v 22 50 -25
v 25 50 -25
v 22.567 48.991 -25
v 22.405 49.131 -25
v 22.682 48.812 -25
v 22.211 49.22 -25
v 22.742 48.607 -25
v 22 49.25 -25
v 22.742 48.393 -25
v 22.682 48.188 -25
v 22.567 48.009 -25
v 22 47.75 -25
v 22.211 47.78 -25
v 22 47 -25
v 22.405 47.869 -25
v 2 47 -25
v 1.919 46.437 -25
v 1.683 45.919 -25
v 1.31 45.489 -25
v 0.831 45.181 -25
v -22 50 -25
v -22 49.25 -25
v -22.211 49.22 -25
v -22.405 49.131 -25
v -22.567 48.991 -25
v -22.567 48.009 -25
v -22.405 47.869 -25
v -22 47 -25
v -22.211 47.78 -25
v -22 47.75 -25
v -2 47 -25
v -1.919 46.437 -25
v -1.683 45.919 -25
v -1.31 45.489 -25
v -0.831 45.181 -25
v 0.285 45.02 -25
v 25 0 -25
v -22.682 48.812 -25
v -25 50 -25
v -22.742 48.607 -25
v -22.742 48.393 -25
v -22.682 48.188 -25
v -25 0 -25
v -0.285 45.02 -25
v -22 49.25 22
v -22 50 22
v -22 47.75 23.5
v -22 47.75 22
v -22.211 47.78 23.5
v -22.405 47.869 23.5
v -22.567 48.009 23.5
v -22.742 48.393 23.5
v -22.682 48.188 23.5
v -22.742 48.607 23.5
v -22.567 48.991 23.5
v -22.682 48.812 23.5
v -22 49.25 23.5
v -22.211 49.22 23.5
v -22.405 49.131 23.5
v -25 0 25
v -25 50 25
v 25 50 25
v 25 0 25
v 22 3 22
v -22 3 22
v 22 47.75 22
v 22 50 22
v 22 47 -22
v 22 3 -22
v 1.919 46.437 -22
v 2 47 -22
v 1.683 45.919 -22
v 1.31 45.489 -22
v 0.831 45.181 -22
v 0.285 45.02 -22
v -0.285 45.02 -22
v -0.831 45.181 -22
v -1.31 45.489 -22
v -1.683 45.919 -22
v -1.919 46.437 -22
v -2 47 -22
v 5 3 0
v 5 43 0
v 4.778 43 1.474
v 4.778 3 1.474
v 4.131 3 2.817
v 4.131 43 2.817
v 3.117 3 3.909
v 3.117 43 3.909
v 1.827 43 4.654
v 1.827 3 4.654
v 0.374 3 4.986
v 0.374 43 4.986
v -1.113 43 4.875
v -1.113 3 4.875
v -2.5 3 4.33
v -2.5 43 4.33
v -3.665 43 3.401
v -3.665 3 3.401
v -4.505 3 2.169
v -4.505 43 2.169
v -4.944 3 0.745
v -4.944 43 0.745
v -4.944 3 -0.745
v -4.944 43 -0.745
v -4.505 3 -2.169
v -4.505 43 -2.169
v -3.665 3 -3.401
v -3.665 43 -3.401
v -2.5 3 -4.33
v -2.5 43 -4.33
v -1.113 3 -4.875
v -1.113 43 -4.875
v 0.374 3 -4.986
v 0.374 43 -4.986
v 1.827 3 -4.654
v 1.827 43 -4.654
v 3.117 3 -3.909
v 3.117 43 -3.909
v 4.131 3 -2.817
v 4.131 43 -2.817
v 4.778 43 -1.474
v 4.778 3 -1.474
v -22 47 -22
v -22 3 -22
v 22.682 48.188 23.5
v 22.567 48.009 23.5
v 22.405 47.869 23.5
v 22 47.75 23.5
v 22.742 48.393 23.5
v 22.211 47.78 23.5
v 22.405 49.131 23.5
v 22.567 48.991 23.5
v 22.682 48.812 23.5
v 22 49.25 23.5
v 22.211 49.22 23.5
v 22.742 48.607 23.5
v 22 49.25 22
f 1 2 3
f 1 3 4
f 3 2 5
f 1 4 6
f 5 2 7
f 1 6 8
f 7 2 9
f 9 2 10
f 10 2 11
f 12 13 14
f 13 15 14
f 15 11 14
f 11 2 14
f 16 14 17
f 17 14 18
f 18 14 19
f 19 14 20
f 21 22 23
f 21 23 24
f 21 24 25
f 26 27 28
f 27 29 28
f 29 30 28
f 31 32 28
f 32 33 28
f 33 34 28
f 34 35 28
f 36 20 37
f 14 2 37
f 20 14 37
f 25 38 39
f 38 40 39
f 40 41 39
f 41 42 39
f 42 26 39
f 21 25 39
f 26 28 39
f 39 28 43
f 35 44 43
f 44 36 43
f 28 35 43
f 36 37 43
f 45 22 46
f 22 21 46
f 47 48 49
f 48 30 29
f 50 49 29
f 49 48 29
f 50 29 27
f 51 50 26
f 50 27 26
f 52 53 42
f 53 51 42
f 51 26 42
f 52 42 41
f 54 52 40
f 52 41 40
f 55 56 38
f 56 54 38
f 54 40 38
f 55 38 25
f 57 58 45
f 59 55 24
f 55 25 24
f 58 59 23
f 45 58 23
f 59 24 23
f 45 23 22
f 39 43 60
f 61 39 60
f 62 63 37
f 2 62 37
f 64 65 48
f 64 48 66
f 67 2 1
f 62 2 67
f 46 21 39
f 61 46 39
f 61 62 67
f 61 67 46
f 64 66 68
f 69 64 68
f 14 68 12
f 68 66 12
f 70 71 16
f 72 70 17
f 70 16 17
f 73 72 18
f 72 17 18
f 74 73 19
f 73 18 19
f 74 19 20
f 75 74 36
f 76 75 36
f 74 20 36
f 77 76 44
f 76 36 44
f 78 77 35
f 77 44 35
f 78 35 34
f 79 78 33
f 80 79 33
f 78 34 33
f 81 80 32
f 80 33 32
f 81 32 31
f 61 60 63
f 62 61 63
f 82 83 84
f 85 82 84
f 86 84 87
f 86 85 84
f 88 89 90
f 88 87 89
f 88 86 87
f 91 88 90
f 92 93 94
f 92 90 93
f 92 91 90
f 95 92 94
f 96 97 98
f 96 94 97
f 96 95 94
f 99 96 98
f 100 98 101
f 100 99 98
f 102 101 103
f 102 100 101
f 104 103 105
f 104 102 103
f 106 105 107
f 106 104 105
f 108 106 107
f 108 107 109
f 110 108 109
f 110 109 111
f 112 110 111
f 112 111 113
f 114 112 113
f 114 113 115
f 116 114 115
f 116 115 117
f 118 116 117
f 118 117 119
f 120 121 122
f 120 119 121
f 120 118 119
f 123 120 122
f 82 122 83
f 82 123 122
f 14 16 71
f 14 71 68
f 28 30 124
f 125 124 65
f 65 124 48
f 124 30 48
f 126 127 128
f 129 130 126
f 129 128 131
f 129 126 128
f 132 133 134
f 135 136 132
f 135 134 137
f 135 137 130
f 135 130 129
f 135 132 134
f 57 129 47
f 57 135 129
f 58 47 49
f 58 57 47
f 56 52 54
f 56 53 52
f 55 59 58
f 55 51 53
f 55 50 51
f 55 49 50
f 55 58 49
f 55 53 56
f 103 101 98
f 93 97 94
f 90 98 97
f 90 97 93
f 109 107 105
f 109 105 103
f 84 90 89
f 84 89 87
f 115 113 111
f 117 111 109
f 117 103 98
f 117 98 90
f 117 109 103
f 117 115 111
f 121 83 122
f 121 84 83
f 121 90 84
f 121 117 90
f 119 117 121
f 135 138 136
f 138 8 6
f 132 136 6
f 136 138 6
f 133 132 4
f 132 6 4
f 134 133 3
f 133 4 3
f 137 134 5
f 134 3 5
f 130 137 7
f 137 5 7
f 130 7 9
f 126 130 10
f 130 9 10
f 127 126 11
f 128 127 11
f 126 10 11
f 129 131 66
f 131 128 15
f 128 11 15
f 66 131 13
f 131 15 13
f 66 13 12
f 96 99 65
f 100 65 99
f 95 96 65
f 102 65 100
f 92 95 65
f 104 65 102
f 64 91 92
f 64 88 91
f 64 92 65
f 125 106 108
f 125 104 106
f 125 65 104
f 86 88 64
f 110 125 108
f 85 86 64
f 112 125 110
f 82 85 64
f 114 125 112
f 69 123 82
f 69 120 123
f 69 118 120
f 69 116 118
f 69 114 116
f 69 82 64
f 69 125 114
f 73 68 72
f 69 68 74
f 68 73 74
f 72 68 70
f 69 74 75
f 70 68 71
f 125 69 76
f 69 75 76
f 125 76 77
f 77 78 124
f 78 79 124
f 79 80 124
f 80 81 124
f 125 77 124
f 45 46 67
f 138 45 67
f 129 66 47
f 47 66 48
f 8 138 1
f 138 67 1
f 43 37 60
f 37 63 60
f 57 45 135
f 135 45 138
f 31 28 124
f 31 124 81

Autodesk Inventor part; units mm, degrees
ref_plane "YZ Plane" through (0, 0, 0) normal (1, 0, 0) x (0, 1, 0)
ref_plane "XZ Plane" through (0, 0, 0) normal (0, 1, 0) x (-1, 0, 0)
ref_plane "XY Plane" through (0, 0, 0) normal (0, 0, 1) x (1, 0, 0)
sketch "Sketch1" plane through (0, 0, 0) normal (0, 1, 0) x (-1, 0, 0)
  line L0 (25, 25) -> (-25, 25)
  line L1 (-25, 25) -> (-25, -25)
  line L2 (-25, -25) -> (25, -25)
  line L3 (25, -25) -> (25, 25)
  point P0 (0, 0)
  dimension "d0" = 25
  dimension "d1" = 50
  dimension "d2" = 25
  dimension "d3" = 25
extrude "Extrusion1" add sketch "Sketch1" along normal blind 50
sketch "Sketch2" plane through (0, 50, 0) normal (0, 1, 0) x (1, 0, 0)
  line L0 (-22, -22) -> (22, -22)
  line L1 (22, -22) -> (22, 22)
  line L2 (22, 22) -> (-22, 22)
  line L3 (-22, 22) -> (-22, -22)
  point P0 (0, 0)
  dimension "d6" = 22
  dimension "d7" = 22
  dimension "d8" = 22
  dimension "d9" = 22
extrude "Extrusion2" cut sketch "Sketch2" against normal blind 47
sketch "Sketch3" plane through (0, 3, 0) normal (0, 1, 0) x (1, 0, 0)
  circle A0 centre (0, 0) radius 5
  dimension "d12" = 10
extrude "Extrusion3" add sketch "Sketch3" along normal blind 40
sketch "Sketch4" plane through (0, 50, 0) normal (0, 1, 0) x (1, 0, 0)
  line L0 (-22, 22) -> (22, 22)
  line L1 (22, 22) -> (22, 25)
  line L2 (22, 25) -> (-22, 25)
  line L3 (-22, 25) -> (-22, 22)
  line L4 (25, -25) -> (25, 25) projected
  point P0 (0, 0)
  dimension "d15" = 3
  dimension "d16" = 25
extrude "Extrusion4" cut sketch "Sketch4" against normal blind 3
sketch "Sketch5" plane through (-22, 3, -22) normal (0, 0, 1) x (1, 0, 0)
  point P0 (22, -3)
sketch "Sketch6" plane through (25, 0, -25) normal (0, 0, -1) x (-1, 0, 0)
  line L0 (3, 47) -> (47, 47) projected
  circle A0 centre (25, 47) radius 2
  point P0 (25, 0)
  dimension "d19" = 4
extrude "Extrusion5" cut sketch "Sketch6" against normal blind 3
sketch "Sketch7" plane through (-22, 50, 22) normal (1, 0, 0) x (0, 0, -1)
  point P0 (22, -50)
sketch "Sketch8" plane through (25, 0, -25) normal (0, 0, -1) x (-1, 0, 0)
  line L0 (47, 50) -> (47, 47) projected
  circle A0 centre (47, 48.5) radius 0.75
  line L1 (3, 50) -> (47, 50) projected
  line L2 (3, 47) -> (3, 50) projected
  circle A1 centre (3, 48.5) radius 0.75
  point P0 (25, 0)
  dimension "d22" = 1.5
  dimension "d23" = 1.5
  dimension "d24" = 1.5
extrude "Extrusion6" cut sketch "Sketch8" against normal blind 48.5 contours A0 L0 | L0 A0
sketch "Sketch9" plane through (25, 0, -25) normal (0, 0, -1) x (-1, 0, 0)
  point P0 (25, 0)
sketch "Sketch10" plane through (25, 0, -25) normal (0, 0, -1) x (-1, 0, 0)
  line L0 (3, 50) -> (3, 3) projected
  circle A0 centre (3, 48.5) radius 0.75
  line L1 (3, 50) -> (47, 50) projected
  point P0 (25, 0)
  dimension "d27" = 1.5
  dimension "d28" = 1.5
extrude "Extrusion7" cut sketch "Sketch10" against normal blind 48.5
sketch "Sketch11" plane through (22, 50, 22) normal (0, 0, -1) x (-1, 0, 0)
  line L0 (44, -0.75) -> (0, -0.75)
  line L1 (0, -0.75) -> (0, -2.25)
  line L2 (0, -2.25) -> (44, -2.25)
  line L3 (44, -2.25) -> (44, -0.75)
  point P0 (22, -50)
extrude "Extrusion8" cut sketch "Sketch11" against normal blind 1.5
sketch "Sketch12" plane through (0, 3, 0) normal (0, 1, 0) x (1, 0, 0)
  line L0 (-21.9343, 35.7574) -> (18.5832, 35.7574)
  line L1 (18.5832, 35.7574) -> (18.5832, 64.5461)
  line L2 (18.5832, 64.5461) -> (-21.9343, 64.5461)
  line L3 (-21.9343, 64.5461) -> (-21.9343, 35.7574)
  point P0 (0, 0)
properties part number "Box01"
